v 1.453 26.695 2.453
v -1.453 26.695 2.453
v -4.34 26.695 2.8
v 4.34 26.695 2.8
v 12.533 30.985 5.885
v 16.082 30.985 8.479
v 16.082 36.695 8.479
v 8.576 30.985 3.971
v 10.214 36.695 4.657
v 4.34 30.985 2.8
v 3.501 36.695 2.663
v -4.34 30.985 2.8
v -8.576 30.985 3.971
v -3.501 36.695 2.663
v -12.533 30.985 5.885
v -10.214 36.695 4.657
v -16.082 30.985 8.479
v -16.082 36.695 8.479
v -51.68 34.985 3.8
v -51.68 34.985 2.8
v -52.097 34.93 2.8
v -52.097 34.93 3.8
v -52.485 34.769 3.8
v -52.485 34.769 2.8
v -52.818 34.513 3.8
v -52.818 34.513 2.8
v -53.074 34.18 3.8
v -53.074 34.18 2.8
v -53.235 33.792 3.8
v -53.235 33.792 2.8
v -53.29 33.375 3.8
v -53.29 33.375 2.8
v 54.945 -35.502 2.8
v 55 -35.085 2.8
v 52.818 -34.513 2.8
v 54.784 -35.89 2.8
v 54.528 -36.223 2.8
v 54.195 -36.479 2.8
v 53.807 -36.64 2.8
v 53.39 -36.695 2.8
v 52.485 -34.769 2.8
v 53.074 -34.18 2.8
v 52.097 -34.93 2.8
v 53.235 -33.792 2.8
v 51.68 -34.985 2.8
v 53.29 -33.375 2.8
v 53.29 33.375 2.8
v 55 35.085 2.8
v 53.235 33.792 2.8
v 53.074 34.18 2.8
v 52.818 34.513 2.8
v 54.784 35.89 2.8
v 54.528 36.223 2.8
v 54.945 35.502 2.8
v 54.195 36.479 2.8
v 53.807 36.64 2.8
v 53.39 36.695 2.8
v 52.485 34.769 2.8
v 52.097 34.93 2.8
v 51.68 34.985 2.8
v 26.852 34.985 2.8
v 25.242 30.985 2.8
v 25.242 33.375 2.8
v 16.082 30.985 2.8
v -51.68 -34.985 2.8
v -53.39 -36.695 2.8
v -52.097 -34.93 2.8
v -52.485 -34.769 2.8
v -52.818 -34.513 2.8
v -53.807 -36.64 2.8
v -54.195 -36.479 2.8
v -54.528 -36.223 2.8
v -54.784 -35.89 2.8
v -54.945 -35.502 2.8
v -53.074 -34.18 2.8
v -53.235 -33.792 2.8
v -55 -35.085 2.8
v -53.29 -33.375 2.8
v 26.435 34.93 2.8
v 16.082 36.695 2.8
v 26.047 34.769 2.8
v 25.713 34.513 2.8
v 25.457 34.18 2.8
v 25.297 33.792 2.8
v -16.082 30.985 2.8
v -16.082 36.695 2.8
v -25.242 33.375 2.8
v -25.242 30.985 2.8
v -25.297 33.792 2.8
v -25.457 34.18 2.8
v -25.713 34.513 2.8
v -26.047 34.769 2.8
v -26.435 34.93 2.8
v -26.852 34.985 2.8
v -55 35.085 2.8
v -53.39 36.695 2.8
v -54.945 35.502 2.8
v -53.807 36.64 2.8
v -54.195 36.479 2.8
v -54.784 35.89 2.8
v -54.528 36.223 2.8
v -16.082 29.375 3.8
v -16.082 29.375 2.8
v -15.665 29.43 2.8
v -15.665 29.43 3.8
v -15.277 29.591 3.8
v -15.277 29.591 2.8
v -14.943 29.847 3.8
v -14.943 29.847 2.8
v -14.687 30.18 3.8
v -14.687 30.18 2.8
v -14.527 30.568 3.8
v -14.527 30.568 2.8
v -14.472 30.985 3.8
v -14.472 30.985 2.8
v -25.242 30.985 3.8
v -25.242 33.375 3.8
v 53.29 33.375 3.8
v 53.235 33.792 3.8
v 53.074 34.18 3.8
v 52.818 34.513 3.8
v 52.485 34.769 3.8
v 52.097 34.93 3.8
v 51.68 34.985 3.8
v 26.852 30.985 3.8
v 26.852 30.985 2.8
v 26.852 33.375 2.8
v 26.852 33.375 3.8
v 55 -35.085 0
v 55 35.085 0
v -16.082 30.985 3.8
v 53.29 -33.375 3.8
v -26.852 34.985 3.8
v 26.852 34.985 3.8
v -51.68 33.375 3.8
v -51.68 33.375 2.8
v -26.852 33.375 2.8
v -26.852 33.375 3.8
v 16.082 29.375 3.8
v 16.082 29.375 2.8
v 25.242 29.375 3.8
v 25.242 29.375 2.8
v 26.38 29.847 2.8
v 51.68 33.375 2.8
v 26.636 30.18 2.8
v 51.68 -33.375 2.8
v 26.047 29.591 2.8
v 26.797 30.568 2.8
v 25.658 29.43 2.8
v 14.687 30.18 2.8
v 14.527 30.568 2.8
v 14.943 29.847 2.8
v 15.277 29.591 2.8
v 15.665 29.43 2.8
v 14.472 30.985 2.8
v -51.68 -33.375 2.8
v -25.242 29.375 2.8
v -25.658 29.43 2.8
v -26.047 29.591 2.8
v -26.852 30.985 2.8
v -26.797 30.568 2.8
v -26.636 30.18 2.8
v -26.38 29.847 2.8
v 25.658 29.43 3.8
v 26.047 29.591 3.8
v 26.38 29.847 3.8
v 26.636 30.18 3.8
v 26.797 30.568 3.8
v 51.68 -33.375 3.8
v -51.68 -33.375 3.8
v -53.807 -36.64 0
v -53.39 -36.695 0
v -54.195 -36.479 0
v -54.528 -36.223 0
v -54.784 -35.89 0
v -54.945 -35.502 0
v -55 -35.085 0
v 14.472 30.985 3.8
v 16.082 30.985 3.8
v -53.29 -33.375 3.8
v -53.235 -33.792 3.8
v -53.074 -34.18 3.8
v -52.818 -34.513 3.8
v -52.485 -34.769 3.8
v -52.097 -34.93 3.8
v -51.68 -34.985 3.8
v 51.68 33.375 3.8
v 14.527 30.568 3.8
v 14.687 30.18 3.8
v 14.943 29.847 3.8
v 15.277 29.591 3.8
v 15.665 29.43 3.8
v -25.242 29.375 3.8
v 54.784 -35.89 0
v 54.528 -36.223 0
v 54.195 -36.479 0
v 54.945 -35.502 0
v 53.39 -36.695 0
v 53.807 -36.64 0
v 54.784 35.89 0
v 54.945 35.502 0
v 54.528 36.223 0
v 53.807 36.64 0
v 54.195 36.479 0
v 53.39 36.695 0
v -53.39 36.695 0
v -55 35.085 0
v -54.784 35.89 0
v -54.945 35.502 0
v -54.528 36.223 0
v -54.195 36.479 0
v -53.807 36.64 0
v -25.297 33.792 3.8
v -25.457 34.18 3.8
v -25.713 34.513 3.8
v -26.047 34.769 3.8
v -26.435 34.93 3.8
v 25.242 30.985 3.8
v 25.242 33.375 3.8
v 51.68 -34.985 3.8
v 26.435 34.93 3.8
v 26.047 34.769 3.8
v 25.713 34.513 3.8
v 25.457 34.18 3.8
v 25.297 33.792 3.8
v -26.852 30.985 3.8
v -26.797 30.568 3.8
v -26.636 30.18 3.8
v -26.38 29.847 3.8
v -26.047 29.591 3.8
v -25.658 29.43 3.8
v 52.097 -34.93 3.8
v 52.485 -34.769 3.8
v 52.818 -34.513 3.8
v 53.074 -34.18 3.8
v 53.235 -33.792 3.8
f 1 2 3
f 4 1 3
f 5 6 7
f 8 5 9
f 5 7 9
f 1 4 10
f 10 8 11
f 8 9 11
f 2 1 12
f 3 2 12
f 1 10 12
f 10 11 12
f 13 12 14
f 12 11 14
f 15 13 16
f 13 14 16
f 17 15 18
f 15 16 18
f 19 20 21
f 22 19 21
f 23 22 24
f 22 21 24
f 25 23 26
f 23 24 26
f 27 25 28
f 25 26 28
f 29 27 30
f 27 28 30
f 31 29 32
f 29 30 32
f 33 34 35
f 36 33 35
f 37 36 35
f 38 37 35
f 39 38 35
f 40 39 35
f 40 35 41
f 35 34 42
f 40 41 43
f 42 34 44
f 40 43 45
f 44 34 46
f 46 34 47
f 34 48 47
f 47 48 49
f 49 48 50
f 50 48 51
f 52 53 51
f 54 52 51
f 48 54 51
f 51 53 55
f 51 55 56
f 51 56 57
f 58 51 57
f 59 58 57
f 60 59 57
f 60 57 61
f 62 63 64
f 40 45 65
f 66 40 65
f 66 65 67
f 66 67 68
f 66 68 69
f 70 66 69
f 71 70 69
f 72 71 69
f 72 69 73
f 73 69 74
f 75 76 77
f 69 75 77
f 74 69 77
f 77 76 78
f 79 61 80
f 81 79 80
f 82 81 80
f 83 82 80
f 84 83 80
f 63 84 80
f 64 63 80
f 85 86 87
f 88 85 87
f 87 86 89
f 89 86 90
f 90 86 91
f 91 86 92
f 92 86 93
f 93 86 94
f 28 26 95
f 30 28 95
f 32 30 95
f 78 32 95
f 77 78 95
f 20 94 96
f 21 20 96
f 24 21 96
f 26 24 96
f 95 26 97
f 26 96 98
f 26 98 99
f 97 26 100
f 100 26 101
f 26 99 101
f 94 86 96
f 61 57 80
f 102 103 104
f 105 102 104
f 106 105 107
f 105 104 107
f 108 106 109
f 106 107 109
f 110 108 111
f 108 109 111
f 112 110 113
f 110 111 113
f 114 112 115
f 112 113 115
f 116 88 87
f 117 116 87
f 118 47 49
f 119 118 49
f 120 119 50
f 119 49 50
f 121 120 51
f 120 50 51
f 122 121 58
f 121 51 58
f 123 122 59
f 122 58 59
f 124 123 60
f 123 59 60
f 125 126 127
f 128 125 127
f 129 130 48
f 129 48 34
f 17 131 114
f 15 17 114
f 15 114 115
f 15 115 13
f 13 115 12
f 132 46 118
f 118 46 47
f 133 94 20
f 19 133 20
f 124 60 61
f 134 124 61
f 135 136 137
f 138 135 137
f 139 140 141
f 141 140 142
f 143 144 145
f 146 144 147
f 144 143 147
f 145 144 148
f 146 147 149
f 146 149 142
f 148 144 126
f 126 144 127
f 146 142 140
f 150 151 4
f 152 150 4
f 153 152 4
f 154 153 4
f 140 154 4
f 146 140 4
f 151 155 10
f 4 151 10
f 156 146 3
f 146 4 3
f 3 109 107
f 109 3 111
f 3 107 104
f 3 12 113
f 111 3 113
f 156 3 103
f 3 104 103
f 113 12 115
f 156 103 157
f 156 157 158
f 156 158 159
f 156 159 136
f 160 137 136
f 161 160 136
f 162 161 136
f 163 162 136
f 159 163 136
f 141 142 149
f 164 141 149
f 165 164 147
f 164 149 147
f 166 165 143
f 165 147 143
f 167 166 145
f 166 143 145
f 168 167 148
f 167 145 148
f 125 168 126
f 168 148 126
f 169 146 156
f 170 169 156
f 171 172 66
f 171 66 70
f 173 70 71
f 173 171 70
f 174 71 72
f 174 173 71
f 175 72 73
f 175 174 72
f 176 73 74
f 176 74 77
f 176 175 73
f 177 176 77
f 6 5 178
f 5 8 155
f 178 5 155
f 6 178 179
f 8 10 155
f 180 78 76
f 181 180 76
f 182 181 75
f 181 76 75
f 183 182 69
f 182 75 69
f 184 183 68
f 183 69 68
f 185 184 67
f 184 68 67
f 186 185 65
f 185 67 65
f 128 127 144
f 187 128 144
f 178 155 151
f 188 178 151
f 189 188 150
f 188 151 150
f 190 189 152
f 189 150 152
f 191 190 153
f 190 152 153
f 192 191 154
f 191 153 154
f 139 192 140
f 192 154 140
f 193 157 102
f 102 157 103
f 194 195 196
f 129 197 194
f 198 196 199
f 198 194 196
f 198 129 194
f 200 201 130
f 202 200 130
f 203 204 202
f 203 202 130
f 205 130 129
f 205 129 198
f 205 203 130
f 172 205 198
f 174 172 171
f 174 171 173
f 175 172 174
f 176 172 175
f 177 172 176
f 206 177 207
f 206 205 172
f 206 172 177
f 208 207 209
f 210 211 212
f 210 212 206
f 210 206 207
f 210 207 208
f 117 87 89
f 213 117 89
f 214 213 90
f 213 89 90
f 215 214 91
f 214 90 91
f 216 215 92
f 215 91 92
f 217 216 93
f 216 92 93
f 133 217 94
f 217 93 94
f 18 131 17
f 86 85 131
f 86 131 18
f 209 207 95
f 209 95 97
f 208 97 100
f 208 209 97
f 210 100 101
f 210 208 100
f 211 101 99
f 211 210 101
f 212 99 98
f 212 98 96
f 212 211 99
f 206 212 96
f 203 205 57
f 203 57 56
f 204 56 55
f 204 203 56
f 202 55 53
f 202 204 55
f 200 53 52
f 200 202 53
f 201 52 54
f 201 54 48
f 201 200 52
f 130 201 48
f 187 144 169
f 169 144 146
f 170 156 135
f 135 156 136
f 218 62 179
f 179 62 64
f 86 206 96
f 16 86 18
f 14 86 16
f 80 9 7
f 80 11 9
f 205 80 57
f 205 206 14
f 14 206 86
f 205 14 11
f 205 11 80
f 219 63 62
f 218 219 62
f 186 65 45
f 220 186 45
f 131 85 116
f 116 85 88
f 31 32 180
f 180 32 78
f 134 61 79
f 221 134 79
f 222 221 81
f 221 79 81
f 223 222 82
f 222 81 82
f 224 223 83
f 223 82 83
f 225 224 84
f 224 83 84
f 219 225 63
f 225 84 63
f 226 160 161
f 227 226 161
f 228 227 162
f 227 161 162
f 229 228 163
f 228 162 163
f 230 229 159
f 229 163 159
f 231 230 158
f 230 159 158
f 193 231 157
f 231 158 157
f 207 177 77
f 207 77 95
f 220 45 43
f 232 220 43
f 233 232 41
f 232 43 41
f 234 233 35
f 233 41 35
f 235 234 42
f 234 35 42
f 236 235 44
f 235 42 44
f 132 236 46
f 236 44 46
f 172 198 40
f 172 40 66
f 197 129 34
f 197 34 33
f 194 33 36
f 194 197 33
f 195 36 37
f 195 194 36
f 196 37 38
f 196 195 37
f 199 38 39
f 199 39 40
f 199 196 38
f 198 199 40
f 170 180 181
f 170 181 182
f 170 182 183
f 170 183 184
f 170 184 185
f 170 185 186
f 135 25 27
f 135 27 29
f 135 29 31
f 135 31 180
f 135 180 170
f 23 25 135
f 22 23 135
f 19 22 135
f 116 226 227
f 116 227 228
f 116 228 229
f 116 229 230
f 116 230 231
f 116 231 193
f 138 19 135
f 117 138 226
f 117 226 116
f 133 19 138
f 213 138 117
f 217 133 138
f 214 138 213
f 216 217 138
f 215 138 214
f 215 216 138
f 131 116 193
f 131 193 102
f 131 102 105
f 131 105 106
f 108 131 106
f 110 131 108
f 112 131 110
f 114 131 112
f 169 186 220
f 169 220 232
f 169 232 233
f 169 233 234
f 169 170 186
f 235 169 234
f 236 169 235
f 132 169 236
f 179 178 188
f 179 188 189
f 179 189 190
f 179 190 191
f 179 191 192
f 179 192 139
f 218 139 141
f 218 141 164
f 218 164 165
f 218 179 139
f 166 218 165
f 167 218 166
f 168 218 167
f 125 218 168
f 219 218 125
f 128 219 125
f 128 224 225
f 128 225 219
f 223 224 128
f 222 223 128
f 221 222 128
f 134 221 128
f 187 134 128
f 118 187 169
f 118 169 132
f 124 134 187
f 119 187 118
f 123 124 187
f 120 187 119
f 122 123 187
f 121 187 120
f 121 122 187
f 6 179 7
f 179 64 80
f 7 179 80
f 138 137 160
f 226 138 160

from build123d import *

# Parameters (mm, degrees)
BOSS_EXTRUDE1_DEPTH = 2.8
BOSS_EXTRUDE2_DEPTH = 1
SKETCH3_W           = 32.16332029
SKETCH3_H           = 5.710000001
BOSS_EXTRUDE3_DEPTH = 5.8
CUT_EXTRUDE1_DEPTH  = 10


with BuildPart() as part:
    # Sketch1 → Boss-Extrude1 (new body)
    with BuildSketch(Plane.XY):
        with BuildLine():
            Line((-53.39, 36.695), (53.39, 36.695))
            ThreePointArc((53.39, 36.695), (54.528441918, 36.223441918), (55, 35.085))
            Line((55, 35.085), (55, -35.085))
            ThreePointArc((55, -35.085), (54.528441918, -36.223441918), (53.39, -36.695))
            Line((53.39, -36.695), (-53.39, -36.695))
            ThreePointArc((-53.39, -36.695), (-54.528441918, -36.223441918), (-55, -35.085))
            Line((-55, -35.085), (-55, 35.085))
            ThreePointArc((-55, 35.085), (-54.528441918, 36.223441918), (-53.39, 36.695))
        make_face()
    extrude(amount=BOSS_EXTRUDE1_DEPTH)

    # Sketch2 → Boss-Extrude2 (add)
    with BuildSketch(Plane.XY.offset(2.8)):
        with BuildLine():
            Line((25.241660148, 33.374999999), (25.241660148, 30.984999999))
            Line((25.241660148, 30.984999999), (14.471660145, 30.984999999))
            ThreePointArc((14.471660145, 30.984999999), (14.943218227, 29.846558082), (16.081660145, 29.374999999))
            Line((16.081660145, 29.374999999), (25.241660148, 29.374999999))
            ThreePointArc((25.241660148, 29.374999999), (26.380102065, 29.846558082), (26.851660148, 30.984999999))
            Line((26.851660148, 30.984999999), (26.851660148, 33.374999999))
            Line((26.851660148, 33.374999999), (51.679999999, 33.374999999))
            Line((51.679999999, 33.374999999), (51.679999999, -33.374999999))
            Line((51.679999999, -33.374999999), (-51.679999999, -33.374999999))
            Line((-51.679999999, -33.374999999), (-51.679999999, 33.374999999))
            Line((-51.679999999, 33.374999999), (-26.851660148, 33.374999999))
            Line((-26.851660148, 33.374999999), (-26.851660148, 30.984999999))
            ThreePointArc((-26.851660148, 30.984999999), (-26.380102065, 29.846558082), (-25.241660148, 29.374999999))
            Line((-25.241660148, 29.374999999), (-16.081660145, 29.374999999))
            ThreePointArc((-16.081660145, 29.374999999), (-14.943218227, 29.846558082), (-14.471660145, 30.984999999))
            Line((-14.471660145, 30.984999999), (-25.241660148, 30.984999999))
            Line((-25.241660148, 30.984999999), (-25.241660148, 33.374999999))
            ThreePointArc((-25.241660148, 33.374999999), (-25.71321823, 34.513441917), (-26.851660148, 34.984999999))
            Line((-26.851660148, 34.984999999), (-51.679999999, 34.984999999))
            ThreePointArc((-51.679999999, 34.984999999), (-52.818441916, 34.513441917), (-53.289999999, 33.374999999))
            Line((-53.289999999, 33.374999999), (-53.289999999, -33.374999999))
            ThreePointArc((-53.289999999, -33.374999999), (-52.818441916, -34.513441917), (-51.679999999, -34.984999999))
            Line((-51.679999999, -34.984999999), (51.679999999, -34.984999999))
            ThreePointArc((51.679999999, -34.984999999), (52.818441916, -34.513441917), (53.289999999, -33.374999999))
            Line((53.289999999, -33.374999999), (53.289999999, 33.374999999))
            ThreePointArc((53.289999999, 33.374999999), (52.818441916, 34.513441917), (51.679999999, 34.984999999))
            Line((51.679999999, 34.984999999), (26.851660148, 34.984999999))
            ThreePointArc((26.851660148, 34.984999999), (25.71321823, 34.513441917), (25.241660148, 33.374999999))
        make_face()
    extrude(amount=BOSS_EXTRUDE2_DEPTH)

    # Sketch3 → Boss-Extrude3 (add)
    with BuildSketch(Plane.XY.offset(2.8)):
        with Locations((0, 33.84)):
            Rectangle(SKETCH3_W, SKETCH3_H)
    extrude(amount=BOSS_EXTRUDE3_DEPTH)

    # Sketch4 → Cut-Extrude1 (cut)
    with BuildSketch(Plane(origin=(0, 36.695, 0), x_dir=(1, 0, 0), z_dir=(0, 1, 0))):
        with BuildLine():
            Line((-16.081660145, -8.479373109), (-16.081660145, -8.6))
            Line((-16.081660145, -8.6), (16.081660145, -8.6))
            Line((16.081660145, -8.6), (16.081660145, -8.479373109))
            ThreePointArc((16.081660145, -8.479373109), (0, -2.41), (-16.081660145, -8.479373109))
        make_face()
    extrude(amount=-CUT_EXTRUDE1_DEPTH, mode=Mode.SUBTRACT)


solid = part.part
